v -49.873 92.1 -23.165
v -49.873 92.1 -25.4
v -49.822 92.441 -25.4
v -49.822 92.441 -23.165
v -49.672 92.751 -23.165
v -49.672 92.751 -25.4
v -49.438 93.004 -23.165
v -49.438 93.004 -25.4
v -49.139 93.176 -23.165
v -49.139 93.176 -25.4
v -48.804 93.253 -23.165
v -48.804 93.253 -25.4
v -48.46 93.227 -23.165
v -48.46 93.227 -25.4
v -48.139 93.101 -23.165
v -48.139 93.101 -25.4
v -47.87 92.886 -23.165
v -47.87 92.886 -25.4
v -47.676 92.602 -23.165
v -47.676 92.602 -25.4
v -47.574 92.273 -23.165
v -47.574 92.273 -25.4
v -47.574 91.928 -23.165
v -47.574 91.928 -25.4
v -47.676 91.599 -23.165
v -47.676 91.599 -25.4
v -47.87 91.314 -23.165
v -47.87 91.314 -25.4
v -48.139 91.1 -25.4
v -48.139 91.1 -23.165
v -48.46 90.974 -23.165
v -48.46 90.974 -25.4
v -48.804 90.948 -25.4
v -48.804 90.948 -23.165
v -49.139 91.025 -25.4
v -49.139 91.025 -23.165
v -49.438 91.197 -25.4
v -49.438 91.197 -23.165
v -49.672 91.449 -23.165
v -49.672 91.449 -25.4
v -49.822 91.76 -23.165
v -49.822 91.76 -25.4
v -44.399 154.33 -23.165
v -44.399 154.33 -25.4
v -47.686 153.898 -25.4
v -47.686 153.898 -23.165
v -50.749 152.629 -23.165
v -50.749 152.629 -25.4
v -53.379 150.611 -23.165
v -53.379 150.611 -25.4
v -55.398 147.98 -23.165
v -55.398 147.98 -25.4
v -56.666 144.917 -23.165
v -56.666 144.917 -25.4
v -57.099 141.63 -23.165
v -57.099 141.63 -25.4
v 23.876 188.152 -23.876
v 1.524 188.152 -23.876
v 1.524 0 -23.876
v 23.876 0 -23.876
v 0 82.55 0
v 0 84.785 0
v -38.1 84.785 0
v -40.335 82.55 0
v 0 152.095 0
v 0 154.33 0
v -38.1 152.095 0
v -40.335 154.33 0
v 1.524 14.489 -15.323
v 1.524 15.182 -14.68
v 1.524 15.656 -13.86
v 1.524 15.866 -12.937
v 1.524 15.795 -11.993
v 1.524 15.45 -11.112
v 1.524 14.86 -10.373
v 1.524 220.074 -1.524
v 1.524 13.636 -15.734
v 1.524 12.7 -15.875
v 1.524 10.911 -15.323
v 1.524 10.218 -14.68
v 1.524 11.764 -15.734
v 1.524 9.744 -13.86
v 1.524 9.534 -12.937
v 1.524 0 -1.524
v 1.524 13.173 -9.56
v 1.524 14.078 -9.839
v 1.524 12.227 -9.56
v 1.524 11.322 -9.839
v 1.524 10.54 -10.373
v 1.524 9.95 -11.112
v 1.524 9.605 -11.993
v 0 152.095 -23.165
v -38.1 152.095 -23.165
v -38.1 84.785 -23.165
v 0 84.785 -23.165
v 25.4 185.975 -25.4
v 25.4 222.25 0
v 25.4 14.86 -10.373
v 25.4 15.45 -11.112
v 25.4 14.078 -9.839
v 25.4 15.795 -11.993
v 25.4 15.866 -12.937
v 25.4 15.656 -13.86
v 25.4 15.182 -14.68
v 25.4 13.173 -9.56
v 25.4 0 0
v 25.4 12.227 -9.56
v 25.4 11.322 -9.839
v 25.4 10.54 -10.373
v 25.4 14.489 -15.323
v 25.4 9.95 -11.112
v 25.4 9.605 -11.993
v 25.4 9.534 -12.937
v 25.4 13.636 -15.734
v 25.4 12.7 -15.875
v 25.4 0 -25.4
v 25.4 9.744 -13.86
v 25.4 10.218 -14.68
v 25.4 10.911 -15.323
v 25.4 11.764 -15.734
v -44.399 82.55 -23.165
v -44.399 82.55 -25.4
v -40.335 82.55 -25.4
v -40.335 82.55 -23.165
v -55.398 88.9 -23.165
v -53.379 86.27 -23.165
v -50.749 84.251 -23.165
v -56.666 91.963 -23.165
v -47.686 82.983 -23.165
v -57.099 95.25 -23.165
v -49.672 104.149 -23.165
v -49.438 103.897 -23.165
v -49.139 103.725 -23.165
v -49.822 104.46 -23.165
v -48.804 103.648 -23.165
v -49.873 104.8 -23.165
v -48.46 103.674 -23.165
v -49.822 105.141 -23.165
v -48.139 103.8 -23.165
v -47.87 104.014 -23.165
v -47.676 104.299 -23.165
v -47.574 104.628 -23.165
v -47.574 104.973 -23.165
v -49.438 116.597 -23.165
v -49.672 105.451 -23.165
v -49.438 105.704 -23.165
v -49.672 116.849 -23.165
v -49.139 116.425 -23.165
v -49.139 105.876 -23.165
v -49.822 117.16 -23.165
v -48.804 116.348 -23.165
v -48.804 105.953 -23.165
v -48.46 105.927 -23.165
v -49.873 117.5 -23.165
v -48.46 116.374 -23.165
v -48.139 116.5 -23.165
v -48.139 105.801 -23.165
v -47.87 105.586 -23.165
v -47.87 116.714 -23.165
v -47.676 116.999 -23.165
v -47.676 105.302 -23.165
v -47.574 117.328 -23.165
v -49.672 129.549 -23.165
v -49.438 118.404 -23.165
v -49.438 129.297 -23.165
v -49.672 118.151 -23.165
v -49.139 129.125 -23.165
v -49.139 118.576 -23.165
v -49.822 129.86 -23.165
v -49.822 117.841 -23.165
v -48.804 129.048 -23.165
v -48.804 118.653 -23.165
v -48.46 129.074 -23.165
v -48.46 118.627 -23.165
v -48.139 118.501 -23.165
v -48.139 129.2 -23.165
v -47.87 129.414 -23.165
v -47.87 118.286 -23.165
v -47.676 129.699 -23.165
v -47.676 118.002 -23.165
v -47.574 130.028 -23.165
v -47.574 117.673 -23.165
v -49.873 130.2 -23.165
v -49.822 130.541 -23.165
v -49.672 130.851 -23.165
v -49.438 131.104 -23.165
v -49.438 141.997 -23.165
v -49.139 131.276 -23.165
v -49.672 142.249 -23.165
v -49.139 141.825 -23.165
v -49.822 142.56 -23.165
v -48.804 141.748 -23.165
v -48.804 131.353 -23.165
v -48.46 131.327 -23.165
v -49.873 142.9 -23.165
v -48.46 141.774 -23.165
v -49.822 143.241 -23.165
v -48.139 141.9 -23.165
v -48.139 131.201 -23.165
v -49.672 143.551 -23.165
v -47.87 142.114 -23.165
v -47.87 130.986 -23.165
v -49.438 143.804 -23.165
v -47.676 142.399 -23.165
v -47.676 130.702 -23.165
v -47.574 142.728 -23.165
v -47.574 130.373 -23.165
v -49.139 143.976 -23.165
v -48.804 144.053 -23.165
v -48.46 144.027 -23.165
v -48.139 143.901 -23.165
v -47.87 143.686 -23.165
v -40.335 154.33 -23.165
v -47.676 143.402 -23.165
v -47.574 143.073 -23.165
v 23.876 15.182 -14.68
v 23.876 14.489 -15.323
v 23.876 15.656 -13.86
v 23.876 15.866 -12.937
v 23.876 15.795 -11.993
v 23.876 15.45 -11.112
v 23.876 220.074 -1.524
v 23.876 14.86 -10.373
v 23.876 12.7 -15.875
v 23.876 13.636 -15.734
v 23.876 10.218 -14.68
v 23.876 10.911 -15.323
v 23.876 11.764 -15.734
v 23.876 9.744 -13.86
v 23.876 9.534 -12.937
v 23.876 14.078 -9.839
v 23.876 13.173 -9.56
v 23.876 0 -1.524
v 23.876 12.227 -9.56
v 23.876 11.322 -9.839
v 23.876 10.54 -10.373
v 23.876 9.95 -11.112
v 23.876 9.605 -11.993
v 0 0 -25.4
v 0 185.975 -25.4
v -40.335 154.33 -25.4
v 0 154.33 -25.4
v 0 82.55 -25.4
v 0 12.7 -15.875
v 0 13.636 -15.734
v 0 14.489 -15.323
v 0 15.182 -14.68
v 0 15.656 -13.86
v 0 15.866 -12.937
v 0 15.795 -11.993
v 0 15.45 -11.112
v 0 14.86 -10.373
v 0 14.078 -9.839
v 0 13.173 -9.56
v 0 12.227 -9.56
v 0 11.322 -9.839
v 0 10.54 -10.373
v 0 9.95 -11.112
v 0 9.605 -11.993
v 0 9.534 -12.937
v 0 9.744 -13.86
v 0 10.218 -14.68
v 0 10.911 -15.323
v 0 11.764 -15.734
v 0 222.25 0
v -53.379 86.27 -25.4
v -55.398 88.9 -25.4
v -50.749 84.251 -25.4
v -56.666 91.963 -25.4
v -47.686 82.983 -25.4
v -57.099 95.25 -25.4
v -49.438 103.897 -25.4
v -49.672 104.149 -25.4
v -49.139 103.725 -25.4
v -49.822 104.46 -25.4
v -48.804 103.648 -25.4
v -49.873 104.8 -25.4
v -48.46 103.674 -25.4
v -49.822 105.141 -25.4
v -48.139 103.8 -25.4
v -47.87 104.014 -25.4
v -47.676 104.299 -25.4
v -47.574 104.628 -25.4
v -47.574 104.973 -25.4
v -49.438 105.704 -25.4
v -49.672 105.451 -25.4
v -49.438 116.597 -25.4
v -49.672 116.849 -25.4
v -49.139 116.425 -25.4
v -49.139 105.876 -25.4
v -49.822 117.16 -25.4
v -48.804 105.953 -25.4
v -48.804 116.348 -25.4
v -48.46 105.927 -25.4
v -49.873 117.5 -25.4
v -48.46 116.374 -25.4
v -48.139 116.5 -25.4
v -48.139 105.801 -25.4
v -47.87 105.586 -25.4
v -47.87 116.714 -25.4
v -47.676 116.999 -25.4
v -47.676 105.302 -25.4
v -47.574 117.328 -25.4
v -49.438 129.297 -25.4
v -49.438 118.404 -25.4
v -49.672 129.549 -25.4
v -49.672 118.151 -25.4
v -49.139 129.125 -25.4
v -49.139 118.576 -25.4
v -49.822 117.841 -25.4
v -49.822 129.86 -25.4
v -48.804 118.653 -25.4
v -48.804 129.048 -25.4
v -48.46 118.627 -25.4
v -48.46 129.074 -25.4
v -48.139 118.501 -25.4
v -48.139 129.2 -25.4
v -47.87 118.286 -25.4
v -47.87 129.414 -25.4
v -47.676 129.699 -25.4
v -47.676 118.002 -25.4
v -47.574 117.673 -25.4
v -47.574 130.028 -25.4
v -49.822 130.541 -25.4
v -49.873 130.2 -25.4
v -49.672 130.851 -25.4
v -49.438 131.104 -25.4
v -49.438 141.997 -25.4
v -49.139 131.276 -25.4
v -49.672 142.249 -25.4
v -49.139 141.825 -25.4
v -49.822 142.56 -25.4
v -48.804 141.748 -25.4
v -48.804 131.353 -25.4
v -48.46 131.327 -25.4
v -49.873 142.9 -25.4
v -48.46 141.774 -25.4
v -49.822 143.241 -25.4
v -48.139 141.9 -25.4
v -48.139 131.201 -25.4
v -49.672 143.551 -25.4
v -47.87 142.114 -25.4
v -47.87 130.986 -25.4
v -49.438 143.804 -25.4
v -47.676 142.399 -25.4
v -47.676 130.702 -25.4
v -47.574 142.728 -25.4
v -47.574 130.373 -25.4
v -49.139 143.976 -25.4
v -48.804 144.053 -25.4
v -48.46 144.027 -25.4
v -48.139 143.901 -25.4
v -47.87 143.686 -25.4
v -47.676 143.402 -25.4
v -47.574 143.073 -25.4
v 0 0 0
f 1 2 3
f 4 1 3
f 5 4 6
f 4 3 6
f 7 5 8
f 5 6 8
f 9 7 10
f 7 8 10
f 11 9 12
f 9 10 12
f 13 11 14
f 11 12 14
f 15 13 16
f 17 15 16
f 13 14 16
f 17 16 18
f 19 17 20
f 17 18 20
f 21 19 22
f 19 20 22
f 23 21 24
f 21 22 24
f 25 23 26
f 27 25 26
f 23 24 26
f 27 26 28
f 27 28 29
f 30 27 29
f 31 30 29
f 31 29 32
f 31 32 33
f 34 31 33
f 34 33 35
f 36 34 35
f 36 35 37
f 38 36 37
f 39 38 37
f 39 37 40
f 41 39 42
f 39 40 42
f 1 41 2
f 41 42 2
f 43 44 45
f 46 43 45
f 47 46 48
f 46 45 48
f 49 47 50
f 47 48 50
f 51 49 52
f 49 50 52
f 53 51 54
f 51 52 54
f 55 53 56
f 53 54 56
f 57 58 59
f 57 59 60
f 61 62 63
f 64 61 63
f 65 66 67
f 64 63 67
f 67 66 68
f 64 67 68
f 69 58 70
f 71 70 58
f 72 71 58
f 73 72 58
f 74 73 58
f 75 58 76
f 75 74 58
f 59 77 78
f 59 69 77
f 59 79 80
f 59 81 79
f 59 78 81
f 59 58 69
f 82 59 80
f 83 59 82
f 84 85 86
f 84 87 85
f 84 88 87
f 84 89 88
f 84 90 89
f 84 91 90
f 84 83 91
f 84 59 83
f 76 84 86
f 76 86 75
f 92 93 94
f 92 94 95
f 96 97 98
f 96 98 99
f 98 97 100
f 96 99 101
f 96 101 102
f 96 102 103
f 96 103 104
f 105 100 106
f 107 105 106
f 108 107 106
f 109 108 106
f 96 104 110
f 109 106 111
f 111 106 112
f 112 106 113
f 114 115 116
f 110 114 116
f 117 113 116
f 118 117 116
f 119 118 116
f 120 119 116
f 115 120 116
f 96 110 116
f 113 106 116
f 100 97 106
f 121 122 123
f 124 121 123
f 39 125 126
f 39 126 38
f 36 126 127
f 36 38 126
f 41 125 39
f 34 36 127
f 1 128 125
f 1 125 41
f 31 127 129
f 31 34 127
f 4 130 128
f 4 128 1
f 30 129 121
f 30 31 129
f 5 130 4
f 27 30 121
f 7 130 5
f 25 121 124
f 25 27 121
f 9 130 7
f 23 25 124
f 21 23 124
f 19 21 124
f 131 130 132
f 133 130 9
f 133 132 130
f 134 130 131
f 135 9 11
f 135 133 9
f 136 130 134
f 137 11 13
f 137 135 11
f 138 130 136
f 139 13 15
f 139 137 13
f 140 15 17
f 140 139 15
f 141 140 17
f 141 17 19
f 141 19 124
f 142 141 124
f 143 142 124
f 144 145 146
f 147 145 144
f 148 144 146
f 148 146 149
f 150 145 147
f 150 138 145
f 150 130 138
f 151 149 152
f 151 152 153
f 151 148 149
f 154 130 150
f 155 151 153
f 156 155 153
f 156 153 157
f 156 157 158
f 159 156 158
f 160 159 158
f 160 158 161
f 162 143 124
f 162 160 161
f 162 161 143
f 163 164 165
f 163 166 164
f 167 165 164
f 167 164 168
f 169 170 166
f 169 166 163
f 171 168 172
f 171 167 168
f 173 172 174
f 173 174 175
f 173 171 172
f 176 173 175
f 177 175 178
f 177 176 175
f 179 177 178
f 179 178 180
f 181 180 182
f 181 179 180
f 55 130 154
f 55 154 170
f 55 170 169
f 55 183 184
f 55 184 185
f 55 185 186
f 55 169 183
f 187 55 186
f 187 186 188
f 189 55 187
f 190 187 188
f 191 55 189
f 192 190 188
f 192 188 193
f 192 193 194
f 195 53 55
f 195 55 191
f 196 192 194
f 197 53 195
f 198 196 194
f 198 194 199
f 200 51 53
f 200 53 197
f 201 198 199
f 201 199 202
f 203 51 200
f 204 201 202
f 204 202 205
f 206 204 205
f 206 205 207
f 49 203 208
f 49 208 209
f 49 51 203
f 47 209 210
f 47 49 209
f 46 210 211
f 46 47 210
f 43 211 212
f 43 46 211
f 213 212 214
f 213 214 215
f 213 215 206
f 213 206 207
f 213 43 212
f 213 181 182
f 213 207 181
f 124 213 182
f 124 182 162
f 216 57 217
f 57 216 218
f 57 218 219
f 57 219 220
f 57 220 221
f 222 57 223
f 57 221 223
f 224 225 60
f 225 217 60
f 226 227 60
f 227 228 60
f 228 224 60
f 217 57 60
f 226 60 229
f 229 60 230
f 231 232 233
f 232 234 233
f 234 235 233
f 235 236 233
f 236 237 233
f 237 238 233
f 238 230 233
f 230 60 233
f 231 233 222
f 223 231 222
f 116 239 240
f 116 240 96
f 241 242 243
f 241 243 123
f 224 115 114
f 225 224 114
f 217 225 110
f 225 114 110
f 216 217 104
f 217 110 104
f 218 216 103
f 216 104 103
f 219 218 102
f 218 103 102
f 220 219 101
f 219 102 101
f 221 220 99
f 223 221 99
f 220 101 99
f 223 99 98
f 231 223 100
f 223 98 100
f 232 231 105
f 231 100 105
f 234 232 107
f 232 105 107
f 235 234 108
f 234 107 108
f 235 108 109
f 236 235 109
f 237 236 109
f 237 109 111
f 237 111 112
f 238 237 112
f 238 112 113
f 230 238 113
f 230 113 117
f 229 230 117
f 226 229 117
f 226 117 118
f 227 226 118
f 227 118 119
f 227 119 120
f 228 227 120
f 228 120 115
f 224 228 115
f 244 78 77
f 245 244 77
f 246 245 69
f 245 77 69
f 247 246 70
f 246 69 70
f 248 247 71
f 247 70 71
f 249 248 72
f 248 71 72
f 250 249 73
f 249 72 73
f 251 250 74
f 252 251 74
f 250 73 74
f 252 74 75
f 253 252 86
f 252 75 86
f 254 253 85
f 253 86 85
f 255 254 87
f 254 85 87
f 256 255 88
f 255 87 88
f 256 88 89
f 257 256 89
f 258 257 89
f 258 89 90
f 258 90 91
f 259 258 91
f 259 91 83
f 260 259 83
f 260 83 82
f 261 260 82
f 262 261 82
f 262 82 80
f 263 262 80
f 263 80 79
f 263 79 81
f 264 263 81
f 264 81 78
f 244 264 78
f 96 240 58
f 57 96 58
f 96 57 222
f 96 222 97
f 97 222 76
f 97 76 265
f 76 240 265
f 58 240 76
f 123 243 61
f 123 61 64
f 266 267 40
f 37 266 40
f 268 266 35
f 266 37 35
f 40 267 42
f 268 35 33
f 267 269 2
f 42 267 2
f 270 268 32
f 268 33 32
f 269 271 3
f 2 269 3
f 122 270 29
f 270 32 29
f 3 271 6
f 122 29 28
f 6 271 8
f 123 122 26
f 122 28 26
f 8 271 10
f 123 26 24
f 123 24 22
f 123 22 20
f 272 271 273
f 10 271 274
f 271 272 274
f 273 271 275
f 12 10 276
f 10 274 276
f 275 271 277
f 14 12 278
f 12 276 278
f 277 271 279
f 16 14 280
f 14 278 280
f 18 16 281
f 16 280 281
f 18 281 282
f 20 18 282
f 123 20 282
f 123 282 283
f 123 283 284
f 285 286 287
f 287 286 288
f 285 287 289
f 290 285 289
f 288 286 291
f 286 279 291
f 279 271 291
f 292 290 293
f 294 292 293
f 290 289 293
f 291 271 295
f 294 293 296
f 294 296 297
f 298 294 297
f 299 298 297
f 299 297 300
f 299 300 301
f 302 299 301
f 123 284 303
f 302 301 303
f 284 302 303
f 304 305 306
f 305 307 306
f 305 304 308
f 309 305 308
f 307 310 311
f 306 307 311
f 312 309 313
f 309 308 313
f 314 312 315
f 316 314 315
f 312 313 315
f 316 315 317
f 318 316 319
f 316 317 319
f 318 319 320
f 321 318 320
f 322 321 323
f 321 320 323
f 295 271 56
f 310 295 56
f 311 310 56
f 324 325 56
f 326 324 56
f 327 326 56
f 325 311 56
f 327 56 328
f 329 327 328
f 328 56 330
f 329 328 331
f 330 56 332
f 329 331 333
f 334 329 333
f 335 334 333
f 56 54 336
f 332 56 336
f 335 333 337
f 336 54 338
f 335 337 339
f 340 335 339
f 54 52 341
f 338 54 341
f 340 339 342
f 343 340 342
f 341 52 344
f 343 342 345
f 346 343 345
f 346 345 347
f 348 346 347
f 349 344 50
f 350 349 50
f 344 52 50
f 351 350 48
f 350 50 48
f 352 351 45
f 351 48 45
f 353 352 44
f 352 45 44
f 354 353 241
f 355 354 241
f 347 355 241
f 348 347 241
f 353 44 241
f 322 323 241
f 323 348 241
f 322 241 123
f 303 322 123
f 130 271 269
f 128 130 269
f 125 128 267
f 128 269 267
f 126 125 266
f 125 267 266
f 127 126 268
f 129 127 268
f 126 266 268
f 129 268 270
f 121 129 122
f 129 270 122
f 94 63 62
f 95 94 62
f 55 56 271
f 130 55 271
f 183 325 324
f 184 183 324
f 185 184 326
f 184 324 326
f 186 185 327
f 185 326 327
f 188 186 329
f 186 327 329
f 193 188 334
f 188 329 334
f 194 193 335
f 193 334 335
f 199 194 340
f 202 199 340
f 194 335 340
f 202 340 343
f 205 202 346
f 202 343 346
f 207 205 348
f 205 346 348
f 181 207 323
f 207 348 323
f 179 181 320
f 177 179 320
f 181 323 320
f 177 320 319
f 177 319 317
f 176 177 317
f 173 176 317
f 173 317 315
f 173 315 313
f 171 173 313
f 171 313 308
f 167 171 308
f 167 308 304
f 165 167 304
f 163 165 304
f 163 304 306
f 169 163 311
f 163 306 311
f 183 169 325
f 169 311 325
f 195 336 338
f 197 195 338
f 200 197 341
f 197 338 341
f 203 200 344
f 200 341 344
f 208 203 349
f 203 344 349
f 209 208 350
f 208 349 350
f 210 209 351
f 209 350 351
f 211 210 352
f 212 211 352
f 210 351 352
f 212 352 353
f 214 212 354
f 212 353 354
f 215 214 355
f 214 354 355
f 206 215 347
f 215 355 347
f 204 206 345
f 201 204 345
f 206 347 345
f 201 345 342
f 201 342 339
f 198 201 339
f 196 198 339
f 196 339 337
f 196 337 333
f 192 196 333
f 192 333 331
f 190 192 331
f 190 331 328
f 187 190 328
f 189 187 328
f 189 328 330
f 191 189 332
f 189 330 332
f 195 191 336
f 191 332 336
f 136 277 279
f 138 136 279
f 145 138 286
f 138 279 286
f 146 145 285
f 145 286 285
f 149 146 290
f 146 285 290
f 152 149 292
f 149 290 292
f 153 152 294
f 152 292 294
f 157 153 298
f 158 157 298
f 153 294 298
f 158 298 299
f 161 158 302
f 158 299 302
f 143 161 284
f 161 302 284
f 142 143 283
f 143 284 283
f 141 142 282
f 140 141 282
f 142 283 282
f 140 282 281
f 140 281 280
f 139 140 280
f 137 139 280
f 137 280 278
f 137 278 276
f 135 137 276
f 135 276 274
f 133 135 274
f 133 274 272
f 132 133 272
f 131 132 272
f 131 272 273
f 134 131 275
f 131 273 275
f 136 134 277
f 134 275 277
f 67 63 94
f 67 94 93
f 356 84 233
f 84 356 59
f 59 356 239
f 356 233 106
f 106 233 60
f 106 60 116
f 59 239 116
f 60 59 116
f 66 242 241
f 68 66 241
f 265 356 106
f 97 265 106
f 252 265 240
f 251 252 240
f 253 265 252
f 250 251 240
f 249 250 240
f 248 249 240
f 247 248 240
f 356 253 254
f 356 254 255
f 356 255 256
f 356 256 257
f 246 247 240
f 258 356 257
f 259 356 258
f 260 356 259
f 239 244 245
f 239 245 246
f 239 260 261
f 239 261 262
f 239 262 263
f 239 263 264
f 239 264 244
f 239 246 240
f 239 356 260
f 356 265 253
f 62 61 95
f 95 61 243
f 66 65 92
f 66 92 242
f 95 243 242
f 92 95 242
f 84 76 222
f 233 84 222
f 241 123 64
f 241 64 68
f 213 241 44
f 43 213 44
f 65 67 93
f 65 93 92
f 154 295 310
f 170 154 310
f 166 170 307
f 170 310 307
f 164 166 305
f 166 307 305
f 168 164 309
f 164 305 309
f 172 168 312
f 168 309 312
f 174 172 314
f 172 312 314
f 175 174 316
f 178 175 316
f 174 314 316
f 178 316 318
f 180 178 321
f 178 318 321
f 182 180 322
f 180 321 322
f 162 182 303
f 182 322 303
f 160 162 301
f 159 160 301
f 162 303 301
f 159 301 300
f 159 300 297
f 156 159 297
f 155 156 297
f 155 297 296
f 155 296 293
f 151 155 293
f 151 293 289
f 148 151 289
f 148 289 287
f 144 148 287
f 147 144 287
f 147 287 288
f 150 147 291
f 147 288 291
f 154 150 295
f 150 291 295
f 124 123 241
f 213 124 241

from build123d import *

# Parameters (mm, degrees)
SKETCH2_W               = 25.4
SKETCH2_H               = 25.4
BOSS_EXTRUDE1_DEPTH     = 222.25
CUT_EXTRUDE1_DEPTH      = 226.134143346
CUT_EXTRUDE1_DEPTH_BACK = 226.134143346
SKETCH5_W               = 40.3352
SKETCH5_H               = 71.7804
BOSS_EXTRUDE2_DEPTH     = 25.4
SKETCH6_W               = 38.1
SKETCH6_H               = 67.31
CUT_EXTRUDE2_DEPTH      = 23.1648
SKETCH7_R               = 1.1557
BOSS_EXTRUDE3_DEPTH     = 2.2352
SKETCH8_R               = 3.175
CUT_EXTRUDE3_DEPTH      = 239.424706146
SKETCH9_W               = 22.352
SKETCH9_H               = 22.352
CUT_EXTRUDE5_DEPTH      = 231.869099579


with BuildPart() as part:
    # Sketch2 → Boss-Extrude1 (new body)
    with BuildSketch(Plane(origin=(0, 0, 0), x_dir=(1, 0, 0), z_dir=(0, 1, 0))):
        with Locations((12.7, 12.7)):
            Rectangle(SKETCH2_W, SKETCH2_H)
    extrude(amount=BOSS_EXTRUDE1_DEPTH)

    # Sketch3 → Cut-Extrude1 (cut, two sides: drawn at the far end of the back side and taken through both)
    with BuildSketch(Plane(origin=(25.4, 0, 0), x_dir=(0, 0, -1), z_dir=(1, 0, 0)).offset(-CUT_EXTRUDE1_DEPTH_BACK)):
        Polygon((0, 222.25), (25.4, 222.25), (25.4, 185.975040629), align=None)
    extrude(amount=CUT_EXTRUDE1_DEPTH + CUT_EXTRUDE1_DEPTH_BACK, mode=Mode.SUBTRACT)

    # Sketch8 → Cut-Extrude3 (cut, through all)
    with BuildSketch(Plane(origin=(25.4, 0, 0), x_dir=(0, 0, -1), z_dir=(1, 0, 0))):
        with Locations((12.7, 12.7)):
            Circle(SKETCH8_R)
    extrude(amount=-CUT_EXTRUDE3_DEPTH, mode=Mode.SUBTRACT)

    # Sketch9 → Cut-Extrude5 (cut, through all)
    with BuildSketch(Plane.XZ):
        with Locations((12.7, -12.7)):
            Rectangle(SKETCH9_W, SKETCH9_H)
    extrude(amount=-CUT_EXTRUDE5_DEPTH, mode=Mode.SUBTRACT)


with BuildPart() as body_2:
    # Sketch5 → Boss-Extrude2 (new body)
    with BuildSketch(Plane(origin=(0, 0, -25.4), x_dir=(-1, 0, 0), z_dir=(0, 0, -1))):
        with Locations((20.1676, 118.4402)):
            Rectangle(SKETCH5_W, SKETCH5_H)
    extrude(amount=-BOSS_EXTRUDE2_DEPTH)

    # Sketch6 → Cut-Extrude2 (cut)
    with BuildSketch(Plane.XY):
        with Locations((-19.05, 118.4402)):
            Rectangle(SKETCH6_W, SKETCH6_H)
    extrude(amount=-CUT_EXTRUDE2_DEPTH, mode=Mode.SUBTRACT)


with BuildPart() as body_3:
    # Sketch7 → Boss-Extrude3 (new body)
    with BuildSketch(Plane(origin=(0, 0, -25.4), x_dir=(-1, 0, 0), z_dir=(0, 0, -1))):
        with BuildLine():
            Line((40.3352, 154.3304), (44.3992, 154.3304))
            ThreePointArc((44.3992, 154.3304), (53.379456121, 150.610656121), (57.0992, 141.6304))
            Line((57.0992, 141.6304), (57.0992, 95.25))
            ThreePointArc((57.0992, 95.25), (53.379456121, 86.269743879), (44.3992, 82.55))
            Line((44.3992, 82.55), (40.3352, 82.55))
            Line((40.3352, 82.55), (40.3352, 154.3304))
        make_face()
        with Locations((48.7172, 142.9004)):
            Circle(SKETCH7_R, mode=Mode.SUBTRACT)
        with Locations((48.7172, 130.2004)):
            Circle(SKETCH7_R, mode=Mode.SUBTRACT)
        with Locations((48.7172, 117.5004)):
            Circle(SKETCH7_R, mode=Mode.SUBTRACT)
        with Locations((48.7172, 104.8004)):
            Circle(SKETCH7_R, mode=Mode.SUBTRACT)
        with Locations((48.7172, 92.1004)):
            Circle(SKETCH7_R, mode=Mode.SUBTRACT)
    extrude(amount=-BOSS_EXTRUDE3_DEPTH)


solid = Compound([part.part, body_2.part, body_3.part])
